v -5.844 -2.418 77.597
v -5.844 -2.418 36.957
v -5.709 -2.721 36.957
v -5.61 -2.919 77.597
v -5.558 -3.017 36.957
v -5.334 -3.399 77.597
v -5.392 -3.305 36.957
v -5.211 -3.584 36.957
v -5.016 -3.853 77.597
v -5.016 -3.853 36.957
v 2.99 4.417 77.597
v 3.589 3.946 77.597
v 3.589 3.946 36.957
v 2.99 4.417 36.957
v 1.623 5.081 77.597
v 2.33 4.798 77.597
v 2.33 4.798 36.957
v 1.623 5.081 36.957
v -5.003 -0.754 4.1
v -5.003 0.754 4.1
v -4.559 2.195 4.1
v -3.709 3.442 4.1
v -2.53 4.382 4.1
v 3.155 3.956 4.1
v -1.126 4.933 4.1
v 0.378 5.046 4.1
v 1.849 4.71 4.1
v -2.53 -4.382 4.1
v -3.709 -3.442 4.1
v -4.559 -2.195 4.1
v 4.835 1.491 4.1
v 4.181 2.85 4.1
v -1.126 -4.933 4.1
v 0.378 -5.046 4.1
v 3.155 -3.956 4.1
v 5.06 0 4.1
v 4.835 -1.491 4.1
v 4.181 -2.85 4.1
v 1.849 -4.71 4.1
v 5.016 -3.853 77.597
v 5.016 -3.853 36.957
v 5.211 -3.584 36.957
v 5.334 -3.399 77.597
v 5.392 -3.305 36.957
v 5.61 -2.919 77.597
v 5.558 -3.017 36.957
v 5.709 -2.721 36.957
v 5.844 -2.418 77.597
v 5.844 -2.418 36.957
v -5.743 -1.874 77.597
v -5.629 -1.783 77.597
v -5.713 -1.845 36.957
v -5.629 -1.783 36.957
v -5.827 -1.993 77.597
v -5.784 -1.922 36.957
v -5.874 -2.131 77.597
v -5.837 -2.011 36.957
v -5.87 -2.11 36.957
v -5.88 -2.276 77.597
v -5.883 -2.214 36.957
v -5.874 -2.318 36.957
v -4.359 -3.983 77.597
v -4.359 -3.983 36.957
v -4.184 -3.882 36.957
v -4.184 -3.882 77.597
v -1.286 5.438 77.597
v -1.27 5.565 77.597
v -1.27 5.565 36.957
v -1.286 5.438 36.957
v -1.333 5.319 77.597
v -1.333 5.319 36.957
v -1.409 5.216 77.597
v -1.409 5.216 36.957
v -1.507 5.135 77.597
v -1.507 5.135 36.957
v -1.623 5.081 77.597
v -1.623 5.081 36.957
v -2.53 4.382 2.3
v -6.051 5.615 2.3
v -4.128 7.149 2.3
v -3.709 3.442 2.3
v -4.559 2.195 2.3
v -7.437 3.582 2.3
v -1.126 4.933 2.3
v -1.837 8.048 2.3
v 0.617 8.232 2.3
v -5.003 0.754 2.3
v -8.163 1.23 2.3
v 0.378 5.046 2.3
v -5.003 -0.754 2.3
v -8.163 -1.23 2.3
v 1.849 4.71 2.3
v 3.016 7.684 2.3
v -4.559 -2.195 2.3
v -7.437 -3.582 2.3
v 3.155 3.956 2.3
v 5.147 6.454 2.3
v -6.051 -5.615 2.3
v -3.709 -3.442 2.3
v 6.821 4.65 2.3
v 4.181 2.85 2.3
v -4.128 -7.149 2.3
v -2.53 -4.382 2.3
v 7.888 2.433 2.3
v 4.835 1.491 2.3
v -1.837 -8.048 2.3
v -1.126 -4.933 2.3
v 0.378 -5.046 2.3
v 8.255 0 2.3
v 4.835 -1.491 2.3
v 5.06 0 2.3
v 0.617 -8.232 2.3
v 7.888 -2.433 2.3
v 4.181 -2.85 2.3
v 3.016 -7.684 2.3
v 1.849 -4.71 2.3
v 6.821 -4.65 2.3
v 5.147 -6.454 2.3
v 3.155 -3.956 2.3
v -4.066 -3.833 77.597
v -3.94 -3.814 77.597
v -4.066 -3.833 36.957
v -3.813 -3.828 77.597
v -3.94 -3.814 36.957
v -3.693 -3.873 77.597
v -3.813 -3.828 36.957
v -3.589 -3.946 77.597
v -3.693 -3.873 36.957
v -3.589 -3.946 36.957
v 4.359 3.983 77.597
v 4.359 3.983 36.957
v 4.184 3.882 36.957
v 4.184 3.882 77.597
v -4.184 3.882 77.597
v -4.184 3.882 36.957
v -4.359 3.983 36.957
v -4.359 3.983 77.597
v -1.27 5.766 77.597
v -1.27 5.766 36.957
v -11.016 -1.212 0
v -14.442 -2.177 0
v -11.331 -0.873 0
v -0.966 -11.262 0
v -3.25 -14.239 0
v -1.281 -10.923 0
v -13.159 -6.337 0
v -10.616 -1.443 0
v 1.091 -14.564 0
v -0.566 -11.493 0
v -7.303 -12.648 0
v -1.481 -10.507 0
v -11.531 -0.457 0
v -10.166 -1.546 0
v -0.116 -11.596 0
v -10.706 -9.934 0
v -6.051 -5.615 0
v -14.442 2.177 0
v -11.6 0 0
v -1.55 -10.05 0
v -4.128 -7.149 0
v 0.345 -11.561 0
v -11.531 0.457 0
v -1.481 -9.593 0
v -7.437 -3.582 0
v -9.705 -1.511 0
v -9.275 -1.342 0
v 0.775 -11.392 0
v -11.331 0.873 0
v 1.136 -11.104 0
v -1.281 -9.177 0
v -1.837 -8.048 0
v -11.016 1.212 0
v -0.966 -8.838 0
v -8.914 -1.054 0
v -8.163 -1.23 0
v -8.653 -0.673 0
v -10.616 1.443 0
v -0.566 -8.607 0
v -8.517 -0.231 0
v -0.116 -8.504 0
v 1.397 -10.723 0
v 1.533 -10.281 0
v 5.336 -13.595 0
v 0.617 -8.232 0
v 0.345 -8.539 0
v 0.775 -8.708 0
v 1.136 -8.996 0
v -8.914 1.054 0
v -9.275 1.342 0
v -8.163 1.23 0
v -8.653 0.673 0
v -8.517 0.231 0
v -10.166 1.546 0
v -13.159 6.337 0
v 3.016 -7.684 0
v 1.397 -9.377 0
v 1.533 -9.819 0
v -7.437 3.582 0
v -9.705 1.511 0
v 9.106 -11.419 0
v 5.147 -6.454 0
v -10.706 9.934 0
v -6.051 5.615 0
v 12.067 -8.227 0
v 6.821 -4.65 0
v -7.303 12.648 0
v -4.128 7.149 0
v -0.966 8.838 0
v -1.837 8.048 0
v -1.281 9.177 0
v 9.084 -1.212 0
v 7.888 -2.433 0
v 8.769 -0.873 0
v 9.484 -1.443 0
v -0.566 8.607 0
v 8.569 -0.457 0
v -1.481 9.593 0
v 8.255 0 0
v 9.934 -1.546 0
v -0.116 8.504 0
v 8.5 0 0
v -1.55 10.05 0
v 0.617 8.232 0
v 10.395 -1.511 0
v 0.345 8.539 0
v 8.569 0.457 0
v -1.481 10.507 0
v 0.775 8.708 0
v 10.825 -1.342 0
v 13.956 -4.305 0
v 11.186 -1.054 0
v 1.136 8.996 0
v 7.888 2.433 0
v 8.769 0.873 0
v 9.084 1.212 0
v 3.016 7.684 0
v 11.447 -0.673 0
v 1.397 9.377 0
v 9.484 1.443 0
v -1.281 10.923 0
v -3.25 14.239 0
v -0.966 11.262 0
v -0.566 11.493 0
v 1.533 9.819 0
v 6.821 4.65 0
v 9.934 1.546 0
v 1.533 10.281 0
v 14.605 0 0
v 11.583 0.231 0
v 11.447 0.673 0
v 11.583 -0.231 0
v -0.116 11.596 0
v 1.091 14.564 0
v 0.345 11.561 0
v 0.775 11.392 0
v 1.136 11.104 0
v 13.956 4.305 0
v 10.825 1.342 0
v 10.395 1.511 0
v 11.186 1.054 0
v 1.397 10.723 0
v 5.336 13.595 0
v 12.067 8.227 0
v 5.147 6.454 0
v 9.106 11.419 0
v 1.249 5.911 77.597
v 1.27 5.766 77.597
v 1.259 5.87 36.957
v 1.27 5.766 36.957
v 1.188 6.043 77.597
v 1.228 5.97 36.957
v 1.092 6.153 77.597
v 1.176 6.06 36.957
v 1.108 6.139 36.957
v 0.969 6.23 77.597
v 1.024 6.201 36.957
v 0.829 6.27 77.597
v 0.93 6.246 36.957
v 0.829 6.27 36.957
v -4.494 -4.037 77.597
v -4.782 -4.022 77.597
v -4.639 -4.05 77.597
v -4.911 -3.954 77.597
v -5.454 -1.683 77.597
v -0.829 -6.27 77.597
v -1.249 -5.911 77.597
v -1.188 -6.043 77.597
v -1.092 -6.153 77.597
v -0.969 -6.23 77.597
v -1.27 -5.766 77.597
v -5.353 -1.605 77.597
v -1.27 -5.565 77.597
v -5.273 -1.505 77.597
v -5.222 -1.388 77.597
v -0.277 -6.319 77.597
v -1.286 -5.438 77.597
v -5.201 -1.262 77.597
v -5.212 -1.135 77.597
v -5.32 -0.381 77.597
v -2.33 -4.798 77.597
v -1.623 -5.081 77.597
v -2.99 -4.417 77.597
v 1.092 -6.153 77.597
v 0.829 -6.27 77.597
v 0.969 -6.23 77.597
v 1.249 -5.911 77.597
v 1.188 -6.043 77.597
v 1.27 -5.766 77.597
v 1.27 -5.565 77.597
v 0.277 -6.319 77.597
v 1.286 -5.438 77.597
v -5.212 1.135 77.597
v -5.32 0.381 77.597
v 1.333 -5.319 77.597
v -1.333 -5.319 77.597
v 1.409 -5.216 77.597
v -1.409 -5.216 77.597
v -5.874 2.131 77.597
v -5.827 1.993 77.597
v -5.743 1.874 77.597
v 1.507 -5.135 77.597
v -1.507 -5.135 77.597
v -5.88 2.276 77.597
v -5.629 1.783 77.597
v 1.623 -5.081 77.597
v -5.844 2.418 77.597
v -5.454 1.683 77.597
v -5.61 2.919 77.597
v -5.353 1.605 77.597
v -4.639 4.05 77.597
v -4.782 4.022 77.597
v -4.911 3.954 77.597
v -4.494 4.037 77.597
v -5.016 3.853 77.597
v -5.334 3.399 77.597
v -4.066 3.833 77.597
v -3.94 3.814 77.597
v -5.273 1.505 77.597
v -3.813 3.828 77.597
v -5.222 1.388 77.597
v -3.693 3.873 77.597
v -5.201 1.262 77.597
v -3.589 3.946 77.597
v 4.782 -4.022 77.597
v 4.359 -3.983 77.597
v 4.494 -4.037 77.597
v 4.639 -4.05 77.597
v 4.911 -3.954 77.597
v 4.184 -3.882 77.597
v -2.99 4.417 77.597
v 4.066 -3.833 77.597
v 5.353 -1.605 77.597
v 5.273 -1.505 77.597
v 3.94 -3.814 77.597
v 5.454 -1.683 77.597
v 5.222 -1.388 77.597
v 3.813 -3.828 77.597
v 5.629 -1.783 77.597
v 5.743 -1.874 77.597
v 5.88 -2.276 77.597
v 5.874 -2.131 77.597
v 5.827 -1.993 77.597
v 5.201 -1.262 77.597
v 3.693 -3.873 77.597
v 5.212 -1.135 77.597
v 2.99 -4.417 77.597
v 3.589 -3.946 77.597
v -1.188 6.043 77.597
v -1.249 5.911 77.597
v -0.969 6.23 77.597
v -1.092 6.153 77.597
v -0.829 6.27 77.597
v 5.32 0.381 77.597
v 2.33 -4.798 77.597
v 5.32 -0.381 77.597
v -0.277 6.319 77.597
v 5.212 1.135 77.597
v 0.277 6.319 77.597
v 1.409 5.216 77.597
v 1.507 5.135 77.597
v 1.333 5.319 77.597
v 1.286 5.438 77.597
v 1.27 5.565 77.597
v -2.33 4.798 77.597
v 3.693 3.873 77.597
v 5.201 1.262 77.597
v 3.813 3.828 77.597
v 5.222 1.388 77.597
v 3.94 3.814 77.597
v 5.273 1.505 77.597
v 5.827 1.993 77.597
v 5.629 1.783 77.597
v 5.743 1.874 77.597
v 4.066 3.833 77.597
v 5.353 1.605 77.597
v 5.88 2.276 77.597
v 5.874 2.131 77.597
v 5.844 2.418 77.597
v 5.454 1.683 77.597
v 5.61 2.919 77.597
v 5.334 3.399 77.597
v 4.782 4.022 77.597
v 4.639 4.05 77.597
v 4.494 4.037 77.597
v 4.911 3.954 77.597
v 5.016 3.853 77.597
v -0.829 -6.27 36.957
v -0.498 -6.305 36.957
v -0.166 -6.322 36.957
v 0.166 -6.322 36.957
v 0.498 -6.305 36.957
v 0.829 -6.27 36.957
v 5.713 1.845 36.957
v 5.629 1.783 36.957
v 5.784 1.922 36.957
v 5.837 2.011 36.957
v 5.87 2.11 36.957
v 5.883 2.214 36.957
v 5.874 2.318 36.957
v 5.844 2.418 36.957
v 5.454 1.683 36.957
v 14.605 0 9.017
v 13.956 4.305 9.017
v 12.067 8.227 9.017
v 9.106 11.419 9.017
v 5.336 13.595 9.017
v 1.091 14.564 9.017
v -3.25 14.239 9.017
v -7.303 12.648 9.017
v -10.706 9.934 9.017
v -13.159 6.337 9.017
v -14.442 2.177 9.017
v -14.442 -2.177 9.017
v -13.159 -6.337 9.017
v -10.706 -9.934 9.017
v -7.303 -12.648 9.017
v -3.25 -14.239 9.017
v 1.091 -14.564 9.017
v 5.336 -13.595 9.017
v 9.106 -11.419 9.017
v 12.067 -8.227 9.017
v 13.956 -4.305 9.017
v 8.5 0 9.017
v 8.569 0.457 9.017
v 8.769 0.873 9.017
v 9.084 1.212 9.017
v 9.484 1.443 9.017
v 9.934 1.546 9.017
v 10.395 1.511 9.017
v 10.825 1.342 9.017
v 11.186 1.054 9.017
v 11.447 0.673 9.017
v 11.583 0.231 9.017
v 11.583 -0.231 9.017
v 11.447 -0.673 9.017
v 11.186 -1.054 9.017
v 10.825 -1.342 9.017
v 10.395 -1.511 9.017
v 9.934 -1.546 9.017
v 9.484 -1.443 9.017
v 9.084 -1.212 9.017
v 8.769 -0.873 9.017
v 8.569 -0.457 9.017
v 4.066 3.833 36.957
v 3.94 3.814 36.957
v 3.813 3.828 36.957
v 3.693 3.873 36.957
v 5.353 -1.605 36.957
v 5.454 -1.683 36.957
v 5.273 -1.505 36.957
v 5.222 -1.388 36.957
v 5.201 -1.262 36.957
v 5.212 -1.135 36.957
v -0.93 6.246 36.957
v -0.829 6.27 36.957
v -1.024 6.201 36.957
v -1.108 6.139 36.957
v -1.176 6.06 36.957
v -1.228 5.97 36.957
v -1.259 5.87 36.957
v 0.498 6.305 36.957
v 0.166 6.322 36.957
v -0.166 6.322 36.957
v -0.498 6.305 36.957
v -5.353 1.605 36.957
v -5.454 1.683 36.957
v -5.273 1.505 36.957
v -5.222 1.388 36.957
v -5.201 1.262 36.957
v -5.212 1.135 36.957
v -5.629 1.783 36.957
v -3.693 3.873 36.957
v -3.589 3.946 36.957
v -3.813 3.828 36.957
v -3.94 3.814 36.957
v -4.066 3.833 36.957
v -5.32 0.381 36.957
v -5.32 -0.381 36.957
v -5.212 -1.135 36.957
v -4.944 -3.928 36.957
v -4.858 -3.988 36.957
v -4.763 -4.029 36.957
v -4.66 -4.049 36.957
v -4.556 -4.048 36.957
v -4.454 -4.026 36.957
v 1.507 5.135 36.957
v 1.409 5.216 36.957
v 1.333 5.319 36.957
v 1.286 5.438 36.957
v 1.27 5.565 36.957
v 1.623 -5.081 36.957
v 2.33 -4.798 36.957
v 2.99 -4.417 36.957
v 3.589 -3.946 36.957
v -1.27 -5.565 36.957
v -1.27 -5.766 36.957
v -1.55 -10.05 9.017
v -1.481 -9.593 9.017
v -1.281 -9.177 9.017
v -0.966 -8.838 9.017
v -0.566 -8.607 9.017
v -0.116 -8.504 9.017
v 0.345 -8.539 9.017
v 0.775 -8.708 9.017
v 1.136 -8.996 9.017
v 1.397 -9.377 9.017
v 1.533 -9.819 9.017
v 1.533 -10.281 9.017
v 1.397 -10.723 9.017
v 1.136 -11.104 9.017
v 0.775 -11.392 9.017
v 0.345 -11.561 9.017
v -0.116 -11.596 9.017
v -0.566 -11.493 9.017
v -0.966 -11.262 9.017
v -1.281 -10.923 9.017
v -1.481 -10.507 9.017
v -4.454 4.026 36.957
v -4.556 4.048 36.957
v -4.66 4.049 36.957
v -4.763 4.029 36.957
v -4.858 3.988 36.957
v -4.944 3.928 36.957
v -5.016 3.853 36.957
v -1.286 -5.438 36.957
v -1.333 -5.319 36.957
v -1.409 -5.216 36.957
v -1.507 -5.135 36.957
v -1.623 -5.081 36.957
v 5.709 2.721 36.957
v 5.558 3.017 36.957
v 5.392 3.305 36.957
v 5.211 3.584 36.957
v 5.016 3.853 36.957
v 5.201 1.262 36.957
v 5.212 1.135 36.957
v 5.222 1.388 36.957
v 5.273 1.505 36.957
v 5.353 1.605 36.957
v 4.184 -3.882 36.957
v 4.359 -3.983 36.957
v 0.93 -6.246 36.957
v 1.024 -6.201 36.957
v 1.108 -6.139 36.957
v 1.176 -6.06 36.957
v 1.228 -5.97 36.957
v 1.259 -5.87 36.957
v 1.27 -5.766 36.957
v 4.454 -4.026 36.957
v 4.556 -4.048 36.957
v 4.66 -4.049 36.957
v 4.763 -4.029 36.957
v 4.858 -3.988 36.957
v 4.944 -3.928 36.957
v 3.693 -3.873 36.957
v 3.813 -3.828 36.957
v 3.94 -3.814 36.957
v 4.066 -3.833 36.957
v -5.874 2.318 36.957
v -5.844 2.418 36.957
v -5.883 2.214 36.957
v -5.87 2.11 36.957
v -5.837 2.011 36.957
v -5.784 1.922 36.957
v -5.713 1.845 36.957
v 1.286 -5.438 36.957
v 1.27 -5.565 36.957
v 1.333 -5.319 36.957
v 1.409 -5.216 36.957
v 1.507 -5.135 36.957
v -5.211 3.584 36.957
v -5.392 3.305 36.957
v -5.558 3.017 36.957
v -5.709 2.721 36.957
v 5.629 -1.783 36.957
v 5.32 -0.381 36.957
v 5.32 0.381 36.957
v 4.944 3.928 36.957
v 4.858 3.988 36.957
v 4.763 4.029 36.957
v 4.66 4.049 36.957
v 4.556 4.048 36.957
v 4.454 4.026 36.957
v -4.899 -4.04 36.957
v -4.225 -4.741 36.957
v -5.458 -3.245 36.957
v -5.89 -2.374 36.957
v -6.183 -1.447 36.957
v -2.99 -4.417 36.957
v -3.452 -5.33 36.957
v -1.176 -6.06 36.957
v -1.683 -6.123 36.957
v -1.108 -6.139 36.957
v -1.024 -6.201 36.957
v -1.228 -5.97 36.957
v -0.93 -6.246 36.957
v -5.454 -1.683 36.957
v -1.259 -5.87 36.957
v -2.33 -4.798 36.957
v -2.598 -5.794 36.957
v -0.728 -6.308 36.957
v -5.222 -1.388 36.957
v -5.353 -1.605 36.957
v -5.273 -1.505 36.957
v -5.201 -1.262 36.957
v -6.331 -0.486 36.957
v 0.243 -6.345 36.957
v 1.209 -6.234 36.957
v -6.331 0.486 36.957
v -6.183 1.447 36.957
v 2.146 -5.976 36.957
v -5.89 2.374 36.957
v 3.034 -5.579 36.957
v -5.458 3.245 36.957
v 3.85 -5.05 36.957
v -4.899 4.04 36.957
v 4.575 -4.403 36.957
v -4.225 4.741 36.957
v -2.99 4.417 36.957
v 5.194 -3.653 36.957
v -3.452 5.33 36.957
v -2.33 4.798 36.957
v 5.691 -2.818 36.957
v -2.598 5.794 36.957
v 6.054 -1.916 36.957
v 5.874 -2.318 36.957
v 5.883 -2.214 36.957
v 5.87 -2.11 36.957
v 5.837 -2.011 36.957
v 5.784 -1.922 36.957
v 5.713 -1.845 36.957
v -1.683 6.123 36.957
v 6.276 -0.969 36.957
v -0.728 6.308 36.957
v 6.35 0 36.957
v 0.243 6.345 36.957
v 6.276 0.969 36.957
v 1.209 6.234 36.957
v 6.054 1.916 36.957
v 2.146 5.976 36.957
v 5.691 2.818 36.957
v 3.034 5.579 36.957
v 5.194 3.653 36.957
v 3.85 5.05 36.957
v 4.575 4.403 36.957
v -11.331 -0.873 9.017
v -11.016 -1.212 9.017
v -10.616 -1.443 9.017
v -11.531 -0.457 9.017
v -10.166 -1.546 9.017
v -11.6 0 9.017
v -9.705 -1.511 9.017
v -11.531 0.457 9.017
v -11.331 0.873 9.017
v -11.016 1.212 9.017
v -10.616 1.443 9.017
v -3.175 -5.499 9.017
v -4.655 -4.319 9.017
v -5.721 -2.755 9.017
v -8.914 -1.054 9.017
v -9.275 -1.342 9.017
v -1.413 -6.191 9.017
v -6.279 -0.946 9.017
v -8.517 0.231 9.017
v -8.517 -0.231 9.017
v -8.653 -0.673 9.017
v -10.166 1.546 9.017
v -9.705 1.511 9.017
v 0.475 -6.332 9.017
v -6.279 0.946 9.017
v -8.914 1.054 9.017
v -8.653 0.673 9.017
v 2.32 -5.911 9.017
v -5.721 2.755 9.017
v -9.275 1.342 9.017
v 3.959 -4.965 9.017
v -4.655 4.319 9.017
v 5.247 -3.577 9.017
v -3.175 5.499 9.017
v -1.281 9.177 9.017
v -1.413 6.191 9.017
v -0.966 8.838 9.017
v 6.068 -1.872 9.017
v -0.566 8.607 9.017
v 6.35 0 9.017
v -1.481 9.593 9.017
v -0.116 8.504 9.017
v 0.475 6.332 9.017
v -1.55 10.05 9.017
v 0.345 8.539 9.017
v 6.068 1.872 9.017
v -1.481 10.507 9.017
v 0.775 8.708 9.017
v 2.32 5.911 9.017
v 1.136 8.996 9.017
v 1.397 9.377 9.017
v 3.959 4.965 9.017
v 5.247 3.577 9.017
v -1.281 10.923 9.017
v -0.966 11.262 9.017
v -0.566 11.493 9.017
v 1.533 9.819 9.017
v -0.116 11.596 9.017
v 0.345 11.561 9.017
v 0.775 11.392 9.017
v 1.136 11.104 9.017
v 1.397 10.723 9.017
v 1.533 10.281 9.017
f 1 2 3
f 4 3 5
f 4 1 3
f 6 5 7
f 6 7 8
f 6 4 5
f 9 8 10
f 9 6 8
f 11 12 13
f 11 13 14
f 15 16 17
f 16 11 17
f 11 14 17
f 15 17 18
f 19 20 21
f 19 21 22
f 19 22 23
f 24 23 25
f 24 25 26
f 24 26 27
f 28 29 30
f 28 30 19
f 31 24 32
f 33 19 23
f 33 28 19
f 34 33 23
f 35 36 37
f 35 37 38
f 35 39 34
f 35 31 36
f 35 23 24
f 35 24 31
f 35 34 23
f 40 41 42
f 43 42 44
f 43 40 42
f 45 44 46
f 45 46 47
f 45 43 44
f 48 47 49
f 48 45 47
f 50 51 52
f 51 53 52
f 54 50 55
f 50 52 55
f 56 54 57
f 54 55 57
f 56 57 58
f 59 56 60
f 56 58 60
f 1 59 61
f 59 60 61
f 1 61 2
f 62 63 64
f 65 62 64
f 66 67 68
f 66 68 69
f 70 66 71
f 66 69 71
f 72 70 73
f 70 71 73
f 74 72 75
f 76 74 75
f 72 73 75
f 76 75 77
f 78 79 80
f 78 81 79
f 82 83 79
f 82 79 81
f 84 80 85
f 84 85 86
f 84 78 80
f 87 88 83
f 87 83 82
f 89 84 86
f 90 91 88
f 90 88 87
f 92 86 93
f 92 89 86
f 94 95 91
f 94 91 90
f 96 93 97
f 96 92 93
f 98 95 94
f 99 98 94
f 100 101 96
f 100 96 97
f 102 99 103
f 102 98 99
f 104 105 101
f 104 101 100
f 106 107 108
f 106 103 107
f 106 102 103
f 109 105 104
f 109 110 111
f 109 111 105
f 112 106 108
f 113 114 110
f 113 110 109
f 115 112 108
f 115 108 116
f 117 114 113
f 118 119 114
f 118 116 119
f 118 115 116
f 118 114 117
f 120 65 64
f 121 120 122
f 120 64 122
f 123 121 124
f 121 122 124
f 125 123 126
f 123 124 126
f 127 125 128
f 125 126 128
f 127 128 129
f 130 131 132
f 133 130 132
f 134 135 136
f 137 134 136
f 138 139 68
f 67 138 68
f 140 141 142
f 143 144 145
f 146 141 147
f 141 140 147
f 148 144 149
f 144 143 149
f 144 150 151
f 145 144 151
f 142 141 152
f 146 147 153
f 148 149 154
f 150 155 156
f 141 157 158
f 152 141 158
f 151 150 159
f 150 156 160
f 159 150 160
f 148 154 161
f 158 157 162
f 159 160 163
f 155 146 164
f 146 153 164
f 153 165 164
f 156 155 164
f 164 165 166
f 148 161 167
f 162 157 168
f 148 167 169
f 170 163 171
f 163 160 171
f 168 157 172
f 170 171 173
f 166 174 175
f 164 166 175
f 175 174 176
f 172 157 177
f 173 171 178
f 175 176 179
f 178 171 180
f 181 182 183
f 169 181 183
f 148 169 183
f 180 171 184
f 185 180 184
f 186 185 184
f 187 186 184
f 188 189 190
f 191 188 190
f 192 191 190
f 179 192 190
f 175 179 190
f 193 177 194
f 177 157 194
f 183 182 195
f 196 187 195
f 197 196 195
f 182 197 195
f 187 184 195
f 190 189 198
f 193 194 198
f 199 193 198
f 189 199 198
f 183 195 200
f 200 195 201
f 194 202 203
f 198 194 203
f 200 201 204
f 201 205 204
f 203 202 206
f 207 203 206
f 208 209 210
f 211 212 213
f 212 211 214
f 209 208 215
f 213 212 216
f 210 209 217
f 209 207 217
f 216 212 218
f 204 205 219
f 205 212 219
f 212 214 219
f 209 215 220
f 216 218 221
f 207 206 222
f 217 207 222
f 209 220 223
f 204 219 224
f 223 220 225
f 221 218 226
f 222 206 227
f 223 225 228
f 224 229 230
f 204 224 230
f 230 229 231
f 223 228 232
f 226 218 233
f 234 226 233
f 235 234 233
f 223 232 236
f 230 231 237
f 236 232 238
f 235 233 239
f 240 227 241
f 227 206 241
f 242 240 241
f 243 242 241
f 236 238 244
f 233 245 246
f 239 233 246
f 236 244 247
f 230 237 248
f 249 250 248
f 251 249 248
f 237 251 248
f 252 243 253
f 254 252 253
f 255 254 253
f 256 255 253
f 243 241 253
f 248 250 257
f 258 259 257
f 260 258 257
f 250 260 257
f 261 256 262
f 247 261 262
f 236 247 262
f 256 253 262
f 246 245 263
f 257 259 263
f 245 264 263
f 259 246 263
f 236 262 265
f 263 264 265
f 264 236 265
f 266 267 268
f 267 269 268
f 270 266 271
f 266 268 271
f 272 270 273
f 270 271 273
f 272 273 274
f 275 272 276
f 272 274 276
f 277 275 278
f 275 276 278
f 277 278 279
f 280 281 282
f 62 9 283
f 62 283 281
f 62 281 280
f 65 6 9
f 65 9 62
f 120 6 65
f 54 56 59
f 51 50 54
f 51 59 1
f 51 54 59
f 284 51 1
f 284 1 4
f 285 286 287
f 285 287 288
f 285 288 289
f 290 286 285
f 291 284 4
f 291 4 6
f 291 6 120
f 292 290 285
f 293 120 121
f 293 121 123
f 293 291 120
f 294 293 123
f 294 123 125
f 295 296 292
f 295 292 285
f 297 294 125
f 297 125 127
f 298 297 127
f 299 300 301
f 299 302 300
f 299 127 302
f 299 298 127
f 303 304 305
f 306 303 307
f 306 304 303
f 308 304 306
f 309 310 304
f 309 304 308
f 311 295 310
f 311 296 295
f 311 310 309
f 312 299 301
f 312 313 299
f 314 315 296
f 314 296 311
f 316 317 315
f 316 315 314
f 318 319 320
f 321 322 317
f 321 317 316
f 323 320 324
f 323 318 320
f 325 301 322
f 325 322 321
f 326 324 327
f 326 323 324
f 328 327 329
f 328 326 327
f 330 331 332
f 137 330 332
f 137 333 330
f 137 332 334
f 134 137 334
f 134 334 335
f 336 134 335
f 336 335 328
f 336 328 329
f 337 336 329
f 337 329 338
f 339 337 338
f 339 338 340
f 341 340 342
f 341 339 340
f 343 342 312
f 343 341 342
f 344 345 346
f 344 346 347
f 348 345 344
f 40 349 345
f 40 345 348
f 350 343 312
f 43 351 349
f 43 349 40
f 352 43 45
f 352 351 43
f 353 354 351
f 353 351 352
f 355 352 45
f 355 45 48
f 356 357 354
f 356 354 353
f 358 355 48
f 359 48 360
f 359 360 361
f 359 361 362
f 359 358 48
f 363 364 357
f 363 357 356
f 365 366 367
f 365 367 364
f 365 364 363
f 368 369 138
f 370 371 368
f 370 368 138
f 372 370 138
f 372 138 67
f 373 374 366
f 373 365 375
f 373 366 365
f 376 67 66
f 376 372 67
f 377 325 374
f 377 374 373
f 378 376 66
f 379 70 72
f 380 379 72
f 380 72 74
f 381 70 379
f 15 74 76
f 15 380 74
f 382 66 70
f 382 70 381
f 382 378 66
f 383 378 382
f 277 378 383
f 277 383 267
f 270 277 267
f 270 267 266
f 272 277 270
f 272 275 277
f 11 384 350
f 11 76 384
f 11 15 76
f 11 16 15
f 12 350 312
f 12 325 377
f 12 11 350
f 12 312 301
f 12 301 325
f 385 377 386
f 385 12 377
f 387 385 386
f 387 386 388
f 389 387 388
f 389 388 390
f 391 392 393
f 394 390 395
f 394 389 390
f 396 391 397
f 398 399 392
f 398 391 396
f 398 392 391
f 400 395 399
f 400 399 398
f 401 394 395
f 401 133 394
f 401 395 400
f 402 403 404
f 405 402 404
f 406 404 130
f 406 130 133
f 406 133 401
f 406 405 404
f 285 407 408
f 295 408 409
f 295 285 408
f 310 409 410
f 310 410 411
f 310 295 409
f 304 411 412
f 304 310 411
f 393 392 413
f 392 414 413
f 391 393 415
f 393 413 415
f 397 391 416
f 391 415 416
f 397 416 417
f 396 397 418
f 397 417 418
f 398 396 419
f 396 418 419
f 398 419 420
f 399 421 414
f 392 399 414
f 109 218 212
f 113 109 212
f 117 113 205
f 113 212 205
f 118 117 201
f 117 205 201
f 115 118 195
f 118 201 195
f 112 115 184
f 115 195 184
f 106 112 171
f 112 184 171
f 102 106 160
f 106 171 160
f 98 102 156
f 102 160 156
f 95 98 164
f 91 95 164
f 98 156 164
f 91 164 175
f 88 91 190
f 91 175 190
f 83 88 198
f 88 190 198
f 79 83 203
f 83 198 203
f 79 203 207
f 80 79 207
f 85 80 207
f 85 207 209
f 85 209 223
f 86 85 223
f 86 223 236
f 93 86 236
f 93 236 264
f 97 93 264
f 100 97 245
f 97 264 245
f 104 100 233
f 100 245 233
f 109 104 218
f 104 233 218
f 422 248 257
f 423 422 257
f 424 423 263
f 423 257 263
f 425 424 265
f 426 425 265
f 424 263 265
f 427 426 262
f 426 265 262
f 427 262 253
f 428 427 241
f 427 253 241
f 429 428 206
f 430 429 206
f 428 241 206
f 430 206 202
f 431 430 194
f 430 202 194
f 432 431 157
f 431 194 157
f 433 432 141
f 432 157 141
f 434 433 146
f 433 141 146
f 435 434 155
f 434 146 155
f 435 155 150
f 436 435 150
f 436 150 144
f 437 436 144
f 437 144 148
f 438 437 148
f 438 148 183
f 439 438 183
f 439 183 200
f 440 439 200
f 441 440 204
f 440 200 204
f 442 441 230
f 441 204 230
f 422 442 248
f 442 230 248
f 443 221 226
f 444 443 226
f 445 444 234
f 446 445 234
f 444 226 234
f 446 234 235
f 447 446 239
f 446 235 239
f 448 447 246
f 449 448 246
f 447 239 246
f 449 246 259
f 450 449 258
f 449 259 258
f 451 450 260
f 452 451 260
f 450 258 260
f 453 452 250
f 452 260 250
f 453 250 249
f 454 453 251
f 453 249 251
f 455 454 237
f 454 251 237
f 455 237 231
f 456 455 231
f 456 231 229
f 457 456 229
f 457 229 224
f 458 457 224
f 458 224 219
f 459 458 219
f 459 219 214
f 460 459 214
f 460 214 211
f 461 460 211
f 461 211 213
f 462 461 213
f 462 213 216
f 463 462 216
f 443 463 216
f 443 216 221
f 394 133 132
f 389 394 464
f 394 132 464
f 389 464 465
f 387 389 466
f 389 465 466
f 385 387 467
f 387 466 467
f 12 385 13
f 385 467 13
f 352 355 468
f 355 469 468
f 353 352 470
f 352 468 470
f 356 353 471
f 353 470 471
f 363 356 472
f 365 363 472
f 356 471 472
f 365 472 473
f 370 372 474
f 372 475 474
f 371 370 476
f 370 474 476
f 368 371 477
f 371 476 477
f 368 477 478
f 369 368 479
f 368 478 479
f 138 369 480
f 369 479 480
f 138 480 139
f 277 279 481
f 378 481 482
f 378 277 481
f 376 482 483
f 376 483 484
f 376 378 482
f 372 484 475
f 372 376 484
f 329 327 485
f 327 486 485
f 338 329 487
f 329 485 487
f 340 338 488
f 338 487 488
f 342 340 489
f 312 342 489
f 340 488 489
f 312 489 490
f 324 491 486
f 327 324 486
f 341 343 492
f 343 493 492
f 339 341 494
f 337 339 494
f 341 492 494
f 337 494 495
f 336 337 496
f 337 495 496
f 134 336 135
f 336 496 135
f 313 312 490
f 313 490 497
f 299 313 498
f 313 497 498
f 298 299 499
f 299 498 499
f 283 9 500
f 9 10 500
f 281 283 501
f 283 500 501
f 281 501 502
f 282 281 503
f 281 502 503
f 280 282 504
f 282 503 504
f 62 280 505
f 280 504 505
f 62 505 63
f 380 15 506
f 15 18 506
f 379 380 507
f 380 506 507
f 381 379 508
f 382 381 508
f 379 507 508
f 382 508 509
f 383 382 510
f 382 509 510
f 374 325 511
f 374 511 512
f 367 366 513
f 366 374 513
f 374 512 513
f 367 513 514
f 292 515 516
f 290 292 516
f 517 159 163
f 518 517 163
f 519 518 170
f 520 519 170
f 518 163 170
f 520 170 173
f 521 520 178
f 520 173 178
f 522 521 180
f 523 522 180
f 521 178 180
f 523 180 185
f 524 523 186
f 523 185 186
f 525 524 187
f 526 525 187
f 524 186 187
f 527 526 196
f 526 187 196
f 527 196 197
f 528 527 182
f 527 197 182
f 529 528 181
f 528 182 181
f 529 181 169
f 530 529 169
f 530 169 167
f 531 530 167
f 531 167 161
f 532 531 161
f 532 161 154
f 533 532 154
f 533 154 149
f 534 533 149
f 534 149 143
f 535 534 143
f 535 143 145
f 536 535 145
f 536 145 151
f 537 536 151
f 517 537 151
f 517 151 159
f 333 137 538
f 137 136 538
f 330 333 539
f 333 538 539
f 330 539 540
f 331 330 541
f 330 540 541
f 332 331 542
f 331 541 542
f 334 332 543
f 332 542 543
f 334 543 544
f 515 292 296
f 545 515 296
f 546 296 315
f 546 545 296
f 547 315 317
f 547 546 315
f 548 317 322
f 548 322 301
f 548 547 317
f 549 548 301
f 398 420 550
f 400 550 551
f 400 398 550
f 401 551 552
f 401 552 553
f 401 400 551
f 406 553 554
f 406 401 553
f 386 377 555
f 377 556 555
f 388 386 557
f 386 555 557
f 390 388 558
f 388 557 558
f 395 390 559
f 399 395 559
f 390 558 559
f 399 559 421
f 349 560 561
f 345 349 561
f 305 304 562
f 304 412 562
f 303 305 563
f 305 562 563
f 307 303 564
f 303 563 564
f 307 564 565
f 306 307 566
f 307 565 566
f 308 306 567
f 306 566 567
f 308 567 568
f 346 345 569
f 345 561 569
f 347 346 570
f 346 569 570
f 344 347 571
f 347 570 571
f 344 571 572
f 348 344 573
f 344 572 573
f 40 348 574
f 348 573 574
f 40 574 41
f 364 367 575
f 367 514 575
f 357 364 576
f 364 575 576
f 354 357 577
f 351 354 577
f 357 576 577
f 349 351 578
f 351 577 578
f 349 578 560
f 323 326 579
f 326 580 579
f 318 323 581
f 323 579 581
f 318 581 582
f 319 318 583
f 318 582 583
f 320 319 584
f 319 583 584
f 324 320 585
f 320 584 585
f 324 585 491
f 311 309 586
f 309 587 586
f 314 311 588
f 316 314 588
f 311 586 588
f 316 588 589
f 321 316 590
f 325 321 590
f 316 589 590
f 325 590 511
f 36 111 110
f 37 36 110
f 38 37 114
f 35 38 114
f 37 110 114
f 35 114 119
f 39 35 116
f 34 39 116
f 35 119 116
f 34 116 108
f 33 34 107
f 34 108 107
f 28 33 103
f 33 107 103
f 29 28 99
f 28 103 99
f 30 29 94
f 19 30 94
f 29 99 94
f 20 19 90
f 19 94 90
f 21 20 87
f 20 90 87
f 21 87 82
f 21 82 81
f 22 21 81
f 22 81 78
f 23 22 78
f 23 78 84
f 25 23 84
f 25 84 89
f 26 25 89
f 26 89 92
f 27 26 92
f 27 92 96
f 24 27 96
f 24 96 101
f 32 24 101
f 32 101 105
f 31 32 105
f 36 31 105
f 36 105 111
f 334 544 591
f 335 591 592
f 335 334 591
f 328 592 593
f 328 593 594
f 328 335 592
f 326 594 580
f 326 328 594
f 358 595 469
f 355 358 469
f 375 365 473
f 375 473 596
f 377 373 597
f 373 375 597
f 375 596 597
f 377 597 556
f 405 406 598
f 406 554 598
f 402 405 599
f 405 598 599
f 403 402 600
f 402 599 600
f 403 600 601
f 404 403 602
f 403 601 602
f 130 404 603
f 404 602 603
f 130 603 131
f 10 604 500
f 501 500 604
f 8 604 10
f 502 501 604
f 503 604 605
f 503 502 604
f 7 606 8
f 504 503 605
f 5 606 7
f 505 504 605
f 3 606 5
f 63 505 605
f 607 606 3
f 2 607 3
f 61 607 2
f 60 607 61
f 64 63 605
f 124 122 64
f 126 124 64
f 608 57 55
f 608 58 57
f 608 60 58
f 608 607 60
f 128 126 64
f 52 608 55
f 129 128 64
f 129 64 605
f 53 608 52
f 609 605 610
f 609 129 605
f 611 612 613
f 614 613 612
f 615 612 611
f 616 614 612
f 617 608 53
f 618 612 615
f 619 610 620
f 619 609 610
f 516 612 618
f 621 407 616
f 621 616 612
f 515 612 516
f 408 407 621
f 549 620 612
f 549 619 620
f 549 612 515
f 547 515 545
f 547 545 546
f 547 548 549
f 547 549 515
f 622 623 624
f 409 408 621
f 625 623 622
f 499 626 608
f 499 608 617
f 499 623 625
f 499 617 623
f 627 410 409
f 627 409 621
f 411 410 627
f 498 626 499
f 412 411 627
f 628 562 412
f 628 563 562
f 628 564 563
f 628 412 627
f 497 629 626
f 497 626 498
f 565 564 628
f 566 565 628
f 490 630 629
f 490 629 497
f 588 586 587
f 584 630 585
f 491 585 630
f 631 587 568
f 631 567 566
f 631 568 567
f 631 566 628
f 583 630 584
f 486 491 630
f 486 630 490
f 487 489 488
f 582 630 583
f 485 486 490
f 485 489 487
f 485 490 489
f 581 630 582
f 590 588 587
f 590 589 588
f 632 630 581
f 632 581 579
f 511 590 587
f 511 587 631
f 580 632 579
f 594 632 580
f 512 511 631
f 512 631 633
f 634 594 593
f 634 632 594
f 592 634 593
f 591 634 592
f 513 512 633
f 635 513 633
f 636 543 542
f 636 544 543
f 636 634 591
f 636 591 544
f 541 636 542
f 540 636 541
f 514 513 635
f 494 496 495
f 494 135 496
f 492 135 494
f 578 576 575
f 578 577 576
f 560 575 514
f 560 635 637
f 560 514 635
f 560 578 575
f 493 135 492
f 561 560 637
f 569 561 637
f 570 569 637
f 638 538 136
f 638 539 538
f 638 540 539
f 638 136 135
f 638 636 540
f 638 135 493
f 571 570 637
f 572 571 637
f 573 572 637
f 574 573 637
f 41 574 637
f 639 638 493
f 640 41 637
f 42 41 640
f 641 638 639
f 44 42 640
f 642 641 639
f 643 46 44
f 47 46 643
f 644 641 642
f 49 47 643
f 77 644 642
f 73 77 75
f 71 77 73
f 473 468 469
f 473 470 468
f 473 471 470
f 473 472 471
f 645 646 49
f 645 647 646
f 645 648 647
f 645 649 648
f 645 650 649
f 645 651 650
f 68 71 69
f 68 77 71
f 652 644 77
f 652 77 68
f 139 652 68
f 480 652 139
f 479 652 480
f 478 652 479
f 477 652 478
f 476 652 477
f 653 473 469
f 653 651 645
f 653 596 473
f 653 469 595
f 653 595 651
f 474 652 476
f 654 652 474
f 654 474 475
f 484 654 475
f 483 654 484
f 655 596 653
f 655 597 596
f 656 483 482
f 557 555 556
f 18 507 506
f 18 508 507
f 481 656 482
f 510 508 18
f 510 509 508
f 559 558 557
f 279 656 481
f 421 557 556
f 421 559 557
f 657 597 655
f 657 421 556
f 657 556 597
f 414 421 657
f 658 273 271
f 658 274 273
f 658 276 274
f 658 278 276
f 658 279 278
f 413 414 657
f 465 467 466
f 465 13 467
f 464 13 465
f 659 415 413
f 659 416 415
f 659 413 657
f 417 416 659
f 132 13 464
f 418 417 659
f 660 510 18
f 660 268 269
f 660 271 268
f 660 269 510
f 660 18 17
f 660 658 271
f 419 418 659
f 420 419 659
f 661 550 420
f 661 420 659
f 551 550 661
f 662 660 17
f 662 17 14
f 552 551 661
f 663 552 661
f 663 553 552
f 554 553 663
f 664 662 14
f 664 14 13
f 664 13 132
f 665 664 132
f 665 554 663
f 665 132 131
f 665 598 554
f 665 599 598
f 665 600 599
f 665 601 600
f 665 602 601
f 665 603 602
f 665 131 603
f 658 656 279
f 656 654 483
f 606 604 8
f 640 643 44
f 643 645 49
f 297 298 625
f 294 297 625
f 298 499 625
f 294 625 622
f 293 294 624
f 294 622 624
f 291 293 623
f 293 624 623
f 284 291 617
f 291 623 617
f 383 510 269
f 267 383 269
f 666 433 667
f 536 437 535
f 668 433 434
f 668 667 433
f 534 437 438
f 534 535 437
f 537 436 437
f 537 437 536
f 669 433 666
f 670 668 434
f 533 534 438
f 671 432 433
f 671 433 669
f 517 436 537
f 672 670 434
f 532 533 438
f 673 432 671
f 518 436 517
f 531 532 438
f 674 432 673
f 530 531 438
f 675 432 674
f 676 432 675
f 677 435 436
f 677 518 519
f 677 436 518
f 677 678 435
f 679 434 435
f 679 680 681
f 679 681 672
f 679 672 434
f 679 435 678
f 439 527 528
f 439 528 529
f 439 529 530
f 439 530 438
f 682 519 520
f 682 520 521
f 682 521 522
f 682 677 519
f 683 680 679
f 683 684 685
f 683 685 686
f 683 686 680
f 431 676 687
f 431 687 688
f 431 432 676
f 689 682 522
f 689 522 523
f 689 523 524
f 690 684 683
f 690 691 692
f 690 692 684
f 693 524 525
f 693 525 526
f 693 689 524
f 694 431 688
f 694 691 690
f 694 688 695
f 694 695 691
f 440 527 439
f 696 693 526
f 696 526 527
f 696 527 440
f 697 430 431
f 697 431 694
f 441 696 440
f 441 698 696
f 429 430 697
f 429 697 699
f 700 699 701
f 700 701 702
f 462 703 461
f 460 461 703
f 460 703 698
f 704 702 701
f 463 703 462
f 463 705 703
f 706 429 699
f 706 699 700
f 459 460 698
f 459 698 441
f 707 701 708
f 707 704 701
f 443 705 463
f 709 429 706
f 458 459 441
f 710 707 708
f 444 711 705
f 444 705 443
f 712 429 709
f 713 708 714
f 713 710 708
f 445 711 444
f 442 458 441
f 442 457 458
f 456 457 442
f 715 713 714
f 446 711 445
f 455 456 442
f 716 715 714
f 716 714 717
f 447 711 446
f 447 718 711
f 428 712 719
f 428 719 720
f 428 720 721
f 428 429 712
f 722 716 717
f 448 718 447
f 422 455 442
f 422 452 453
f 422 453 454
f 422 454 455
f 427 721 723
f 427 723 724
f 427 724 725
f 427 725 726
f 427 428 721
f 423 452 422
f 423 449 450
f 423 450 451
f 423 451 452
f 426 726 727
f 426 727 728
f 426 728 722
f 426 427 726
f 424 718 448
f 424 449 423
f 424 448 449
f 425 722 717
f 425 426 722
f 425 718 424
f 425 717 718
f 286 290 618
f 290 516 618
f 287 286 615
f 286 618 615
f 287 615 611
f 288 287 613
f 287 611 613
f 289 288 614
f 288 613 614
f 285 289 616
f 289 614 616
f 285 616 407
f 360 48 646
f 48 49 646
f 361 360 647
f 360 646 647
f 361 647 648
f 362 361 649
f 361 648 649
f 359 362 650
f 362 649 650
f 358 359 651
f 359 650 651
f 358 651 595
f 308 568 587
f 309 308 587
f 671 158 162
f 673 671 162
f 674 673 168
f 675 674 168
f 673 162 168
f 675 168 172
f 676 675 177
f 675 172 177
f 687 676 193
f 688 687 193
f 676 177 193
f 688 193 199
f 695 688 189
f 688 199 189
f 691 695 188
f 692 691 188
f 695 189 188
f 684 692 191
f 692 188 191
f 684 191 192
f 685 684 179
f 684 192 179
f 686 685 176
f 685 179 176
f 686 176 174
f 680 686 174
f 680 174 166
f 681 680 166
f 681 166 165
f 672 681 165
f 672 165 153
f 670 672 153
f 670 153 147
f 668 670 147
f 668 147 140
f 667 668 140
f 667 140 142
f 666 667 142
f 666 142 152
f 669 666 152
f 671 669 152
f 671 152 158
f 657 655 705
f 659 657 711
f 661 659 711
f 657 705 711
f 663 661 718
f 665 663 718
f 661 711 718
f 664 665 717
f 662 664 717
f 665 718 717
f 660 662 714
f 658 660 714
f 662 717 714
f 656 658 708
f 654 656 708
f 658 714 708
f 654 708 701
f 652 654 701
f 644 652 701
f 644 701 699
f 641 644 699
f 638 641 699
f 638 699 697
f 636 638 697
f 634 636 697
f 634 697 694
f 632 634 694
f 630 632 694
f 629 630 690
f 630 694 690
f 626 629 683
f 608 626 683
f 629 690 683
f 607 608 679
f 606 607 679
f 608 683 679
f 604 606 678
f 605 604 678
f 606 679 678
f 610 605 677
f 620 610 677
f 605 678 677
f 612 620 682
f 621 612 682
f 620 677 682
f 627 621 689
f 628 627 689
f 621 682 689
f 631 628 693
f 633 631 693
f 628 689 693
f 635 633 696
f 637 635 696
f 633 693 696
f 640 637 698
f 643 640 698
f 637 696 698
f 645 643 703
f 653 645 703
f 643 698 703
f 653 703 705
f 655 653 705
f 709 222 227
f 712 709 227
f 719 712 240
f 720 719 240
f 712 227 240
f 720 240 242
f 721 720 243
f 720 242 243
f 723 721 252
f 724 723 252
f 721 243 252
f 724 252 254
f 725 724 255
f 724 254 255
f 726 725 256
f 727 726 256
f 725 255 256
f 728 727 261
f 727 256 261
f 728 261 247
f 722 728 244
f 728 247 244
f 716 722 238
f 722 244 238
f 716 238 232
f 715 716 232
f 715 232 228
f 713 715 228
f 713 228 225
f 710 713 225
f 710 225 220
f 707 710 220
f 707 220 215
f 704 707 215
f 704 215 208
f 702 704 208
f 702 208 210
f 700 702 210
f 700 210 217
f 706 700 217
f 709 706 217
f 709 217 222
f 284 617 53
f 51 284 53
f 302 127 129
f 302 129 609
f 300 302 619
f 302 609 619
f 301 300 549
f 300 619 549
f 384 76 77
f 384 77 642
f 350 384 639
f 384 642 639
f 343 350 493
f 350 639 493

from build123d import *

# Parameters (mm, degrees)
F0_R             = 14.605
F1_DEPTH         = 9.017
F2_R             = 6.35
F3_DEPTH         = 27.94
F4_R             = 5.334
F5_DEPTH         = 40.64
F6_R             = 8.255
F7_DEPTH         = 2.3
F8_R             = 5.06
F9_DEPTH         = 4.1
F11_D            = 3.1
F13_DEPTH        = 40.64
F13_COPIES_COUNT = 6
F14_R            = 0.508


# Not quite as in the source:
# - a pattern or mirror of a feature is missing from the dataset's text; its kind, count and spacing are read off the source's solid


with BuildPart() as f1:
    # F0 (on Top) → F1 (new body)
    with BuildSketch(Plane.XY):
        Circle(F0_R)
    extrude(amount=F1_DEPTH)

    # F2 (on face) → F3 (join)
    with BuildSketch(Plane.XY.offset(9.017)):
        Circle(F2_R)
    extrude(amount=F3_DEPTH)

    # F4 (on face) → F5 (join)
    with BuildSketch(Plane.XY.offset(36.957)):
        Circle(F4_R)
    extrude(amount=F5_DEPTH)

    # F6 (on face) → F7 (cut)
    with BuildSketch(Plane(origin=(0, 0, 0), x_dir=(1, 0, 0), z_dir=(0, 0, -1))):
        Circle(F6_R)
    extrude(amount=-F7_DEPTH, mode=Mode.SUBTRACT)

    # F8 (on face) → F9 (cut)
    with BuildSketch(Plane(origin=(0, 0, 0), x_dir=(1, 0, 0), z_dir=(0, 0, -1))):
        Circle(F8_R)
    extrude(amount=-F9_DEPTH, mode=Mode.SUBTRACT)

    # F11 (through all)
    with Locations(Plane.XY.offset(9.017)):
        with Locations((0, -10.05), (-10.05, 0), (0, 10.05), (10.05, 0)):
            Hole(F11_D / 2)

    # F12 (on face) → F13 (join, through all)
    with BuildSketch(Plane.XY.offset(77.597)):
        with BuildLine():
            Line((-1.27, -5.1806038258), (-1.27, -6.1957780109))
            ThreePointArc((-1.27, -6.1957780109), (0, -6.3246), (1.27, -6.1957780109))
            Line((1.27, -6.1957780109), (1.27, -5.1806038258))
            ThreePointArc((1.27, -5.1806038258), (0, -5.334), (-1.27, -5.1806038258))
        make_face()
    f13 = extrude(amount=-F13_DEPTH)

    # F13_copies: F13 ×6 about axis
    f13_copies_axis = Axis((0, 0, 0), (0, 0, 1))
    for i in range(1, F13_COPIES_COUNT):
        add(f13.rotate(f13_copies_axis, i * 360 / F13_COPIES_COUNT))

    # F14
    f14_edges = [f1.edges().sort_by_distance(p)[0] for p in [
        (1.27, -6.195778, 57.277),
        (1.27, -5.180604, 57.277),
        (-1.27, -6.195778, 57.277),
        (-1.27, -5.180604, 57.277),
        (3.851535, -3.690154, 57.277),
        (4.730701, -4.197741, 57.277),
        (6.000701, -1.998037, 57.277),
        (5.121535, -1.49045, 57.277),
        (5.121535, 1.49045, 57.277),
        (6.000701, 1.998037, 57.277),
        (4.730701, 4.197741, 57.277),
        (3.851535, 3.690154, 57.277),
        (1.27, 5.180604, 57.277),
        (1.27, 6.195778, 57.277),
        (-1.27, 6.195778, 57.277),
        (-1.27, 5.180604, 57.277),
        (-3.851535, 3.690154, 57.277),
        (-4.730701, 4.197741, 57.277),
        (-6.000701, 1.998037, 57.277),
        (-5.121535, 1.49045, 57.277),
        (-5.121535, -1.49045, 57.277),
        (-6.000701, -1.998037, 57.277),
        (-4.730701, -4.197741, 57.277),
        (-3.851535, -3.690154, 57.277),
    ]]
    fillet(f14_edges, radius=F14_R)


solid = f1.part
